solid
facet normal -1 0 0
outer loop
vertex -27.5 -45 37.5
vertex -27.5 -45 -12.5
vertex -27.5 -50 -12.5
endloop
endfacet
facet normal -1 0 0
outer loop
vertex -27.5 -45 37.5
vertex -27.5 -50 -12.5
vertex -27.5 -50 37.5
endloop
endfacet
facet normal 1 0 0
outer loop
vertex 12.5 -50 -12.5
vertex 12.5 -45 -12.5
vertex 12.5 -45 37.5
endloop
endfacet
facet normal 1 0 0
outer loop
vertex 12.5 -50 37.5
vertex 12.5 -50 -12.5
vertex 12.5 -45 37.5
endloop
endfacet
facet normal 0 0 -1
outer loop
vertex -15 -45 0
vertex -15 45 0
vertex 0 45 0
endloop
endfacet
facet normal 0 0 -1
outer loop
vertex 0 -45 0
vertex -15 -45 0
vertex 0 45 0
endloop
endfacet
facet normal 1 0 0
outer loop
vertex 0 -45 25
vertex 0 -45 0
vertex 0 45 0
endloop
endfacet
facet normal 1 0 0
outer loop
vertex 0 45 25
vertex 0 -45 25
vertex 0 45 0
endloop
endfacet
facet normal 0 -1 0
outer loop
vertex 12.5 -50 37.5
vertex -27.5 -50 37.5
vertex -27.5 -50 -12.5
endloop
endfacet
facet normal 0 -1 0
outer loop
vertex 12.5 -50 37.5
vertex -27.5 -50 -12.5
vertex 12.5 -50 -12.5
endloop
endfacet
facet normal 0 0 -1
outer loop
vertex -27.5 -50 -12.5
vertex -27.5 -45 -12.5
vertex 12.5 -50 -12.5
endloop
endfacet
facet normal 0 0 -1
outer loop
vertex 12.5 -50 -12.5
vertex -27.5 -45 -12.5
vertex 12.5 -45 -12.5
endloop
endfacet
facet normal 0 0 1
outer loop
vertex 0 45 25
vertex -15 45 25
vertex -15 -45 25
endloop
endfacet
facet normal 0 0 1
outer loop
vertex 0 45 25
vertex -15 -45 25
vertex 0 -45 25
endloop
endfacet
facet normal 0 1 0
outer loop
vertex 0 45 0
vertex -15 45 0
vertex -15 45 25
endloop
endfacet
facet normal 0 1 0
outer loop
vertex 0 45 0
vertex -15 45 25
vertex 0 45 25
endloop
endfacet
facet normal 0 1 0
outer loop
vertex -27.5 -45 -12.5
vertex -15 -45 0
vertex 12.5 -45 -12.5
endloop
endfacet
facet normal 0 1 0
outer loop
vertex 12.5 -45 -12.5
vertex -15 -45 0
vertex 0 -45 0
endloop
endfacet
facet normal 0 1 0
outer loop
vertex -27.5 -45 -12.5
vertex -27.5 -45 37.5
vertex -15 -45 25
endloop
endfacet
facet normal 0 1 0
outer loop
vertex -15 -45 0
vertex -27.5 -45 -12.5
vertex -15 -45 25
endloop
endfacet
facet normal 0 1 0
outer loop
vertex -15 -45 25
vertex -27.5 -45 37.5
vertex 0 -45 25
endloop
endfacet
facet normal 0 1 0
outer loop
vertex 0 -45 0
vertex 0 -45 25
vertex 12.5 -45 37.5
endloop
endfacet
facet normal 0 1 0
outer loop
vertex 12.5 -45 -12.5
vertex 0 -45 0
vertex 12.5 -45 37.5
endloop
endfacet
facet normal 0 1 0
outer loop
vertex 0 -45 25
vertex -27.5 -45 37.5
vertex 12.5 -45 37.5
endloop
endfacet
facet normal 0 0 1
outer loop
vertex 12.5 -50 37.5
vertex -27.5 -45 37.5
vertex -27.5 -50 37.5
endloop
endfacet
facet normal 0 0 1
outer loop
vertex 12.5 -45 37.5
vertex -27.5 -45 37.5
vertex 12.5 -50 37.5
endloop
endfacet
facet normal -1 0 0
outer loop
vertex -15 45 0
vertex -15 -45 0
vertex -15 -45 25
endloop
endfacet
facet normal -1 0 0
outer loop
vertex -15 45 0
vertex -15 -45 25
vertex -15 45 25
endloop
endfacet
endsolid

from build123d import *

# Parameters (mm, degrees)
SKIZZE1_W                       = 15
SKIZZE1_H                       = 90
AUFSATZ_LINEAR_AUSTRAGEN1_DEPTH = 25
SKIZZE2_W                       = 40
SKIZZE2_H                       = 50
AUFSATZ_LINEAR_AUSTRAGEN2_DEPTH = 5


with BuildPart() as part:
    # Skizze1 → Aufsatz-Linear austragen1 (new body)
    with BuildSketch(Plane.XY):
        with Locations((-7.5, 0)):
            Rectangle(SKIZZE1_W, SKIZZE1_H)
    extrude(amount=AUFSATZ_LINEAR_AUSTRAGEN1_DEPTH)

    # Skizze2 → Aufsatz-Linear austragen2 (add)
    with BuildSketch(Plane.XZ.offset(45)):
        with Locations((-7.5, 12.5)):
            Rectangle(SKIZZE2_W, SKIZZE2_H)
    extrude(amount=AUFSATZ_LINEAR_AUSTRAGEN2_DEPTH)


solid = part.part
